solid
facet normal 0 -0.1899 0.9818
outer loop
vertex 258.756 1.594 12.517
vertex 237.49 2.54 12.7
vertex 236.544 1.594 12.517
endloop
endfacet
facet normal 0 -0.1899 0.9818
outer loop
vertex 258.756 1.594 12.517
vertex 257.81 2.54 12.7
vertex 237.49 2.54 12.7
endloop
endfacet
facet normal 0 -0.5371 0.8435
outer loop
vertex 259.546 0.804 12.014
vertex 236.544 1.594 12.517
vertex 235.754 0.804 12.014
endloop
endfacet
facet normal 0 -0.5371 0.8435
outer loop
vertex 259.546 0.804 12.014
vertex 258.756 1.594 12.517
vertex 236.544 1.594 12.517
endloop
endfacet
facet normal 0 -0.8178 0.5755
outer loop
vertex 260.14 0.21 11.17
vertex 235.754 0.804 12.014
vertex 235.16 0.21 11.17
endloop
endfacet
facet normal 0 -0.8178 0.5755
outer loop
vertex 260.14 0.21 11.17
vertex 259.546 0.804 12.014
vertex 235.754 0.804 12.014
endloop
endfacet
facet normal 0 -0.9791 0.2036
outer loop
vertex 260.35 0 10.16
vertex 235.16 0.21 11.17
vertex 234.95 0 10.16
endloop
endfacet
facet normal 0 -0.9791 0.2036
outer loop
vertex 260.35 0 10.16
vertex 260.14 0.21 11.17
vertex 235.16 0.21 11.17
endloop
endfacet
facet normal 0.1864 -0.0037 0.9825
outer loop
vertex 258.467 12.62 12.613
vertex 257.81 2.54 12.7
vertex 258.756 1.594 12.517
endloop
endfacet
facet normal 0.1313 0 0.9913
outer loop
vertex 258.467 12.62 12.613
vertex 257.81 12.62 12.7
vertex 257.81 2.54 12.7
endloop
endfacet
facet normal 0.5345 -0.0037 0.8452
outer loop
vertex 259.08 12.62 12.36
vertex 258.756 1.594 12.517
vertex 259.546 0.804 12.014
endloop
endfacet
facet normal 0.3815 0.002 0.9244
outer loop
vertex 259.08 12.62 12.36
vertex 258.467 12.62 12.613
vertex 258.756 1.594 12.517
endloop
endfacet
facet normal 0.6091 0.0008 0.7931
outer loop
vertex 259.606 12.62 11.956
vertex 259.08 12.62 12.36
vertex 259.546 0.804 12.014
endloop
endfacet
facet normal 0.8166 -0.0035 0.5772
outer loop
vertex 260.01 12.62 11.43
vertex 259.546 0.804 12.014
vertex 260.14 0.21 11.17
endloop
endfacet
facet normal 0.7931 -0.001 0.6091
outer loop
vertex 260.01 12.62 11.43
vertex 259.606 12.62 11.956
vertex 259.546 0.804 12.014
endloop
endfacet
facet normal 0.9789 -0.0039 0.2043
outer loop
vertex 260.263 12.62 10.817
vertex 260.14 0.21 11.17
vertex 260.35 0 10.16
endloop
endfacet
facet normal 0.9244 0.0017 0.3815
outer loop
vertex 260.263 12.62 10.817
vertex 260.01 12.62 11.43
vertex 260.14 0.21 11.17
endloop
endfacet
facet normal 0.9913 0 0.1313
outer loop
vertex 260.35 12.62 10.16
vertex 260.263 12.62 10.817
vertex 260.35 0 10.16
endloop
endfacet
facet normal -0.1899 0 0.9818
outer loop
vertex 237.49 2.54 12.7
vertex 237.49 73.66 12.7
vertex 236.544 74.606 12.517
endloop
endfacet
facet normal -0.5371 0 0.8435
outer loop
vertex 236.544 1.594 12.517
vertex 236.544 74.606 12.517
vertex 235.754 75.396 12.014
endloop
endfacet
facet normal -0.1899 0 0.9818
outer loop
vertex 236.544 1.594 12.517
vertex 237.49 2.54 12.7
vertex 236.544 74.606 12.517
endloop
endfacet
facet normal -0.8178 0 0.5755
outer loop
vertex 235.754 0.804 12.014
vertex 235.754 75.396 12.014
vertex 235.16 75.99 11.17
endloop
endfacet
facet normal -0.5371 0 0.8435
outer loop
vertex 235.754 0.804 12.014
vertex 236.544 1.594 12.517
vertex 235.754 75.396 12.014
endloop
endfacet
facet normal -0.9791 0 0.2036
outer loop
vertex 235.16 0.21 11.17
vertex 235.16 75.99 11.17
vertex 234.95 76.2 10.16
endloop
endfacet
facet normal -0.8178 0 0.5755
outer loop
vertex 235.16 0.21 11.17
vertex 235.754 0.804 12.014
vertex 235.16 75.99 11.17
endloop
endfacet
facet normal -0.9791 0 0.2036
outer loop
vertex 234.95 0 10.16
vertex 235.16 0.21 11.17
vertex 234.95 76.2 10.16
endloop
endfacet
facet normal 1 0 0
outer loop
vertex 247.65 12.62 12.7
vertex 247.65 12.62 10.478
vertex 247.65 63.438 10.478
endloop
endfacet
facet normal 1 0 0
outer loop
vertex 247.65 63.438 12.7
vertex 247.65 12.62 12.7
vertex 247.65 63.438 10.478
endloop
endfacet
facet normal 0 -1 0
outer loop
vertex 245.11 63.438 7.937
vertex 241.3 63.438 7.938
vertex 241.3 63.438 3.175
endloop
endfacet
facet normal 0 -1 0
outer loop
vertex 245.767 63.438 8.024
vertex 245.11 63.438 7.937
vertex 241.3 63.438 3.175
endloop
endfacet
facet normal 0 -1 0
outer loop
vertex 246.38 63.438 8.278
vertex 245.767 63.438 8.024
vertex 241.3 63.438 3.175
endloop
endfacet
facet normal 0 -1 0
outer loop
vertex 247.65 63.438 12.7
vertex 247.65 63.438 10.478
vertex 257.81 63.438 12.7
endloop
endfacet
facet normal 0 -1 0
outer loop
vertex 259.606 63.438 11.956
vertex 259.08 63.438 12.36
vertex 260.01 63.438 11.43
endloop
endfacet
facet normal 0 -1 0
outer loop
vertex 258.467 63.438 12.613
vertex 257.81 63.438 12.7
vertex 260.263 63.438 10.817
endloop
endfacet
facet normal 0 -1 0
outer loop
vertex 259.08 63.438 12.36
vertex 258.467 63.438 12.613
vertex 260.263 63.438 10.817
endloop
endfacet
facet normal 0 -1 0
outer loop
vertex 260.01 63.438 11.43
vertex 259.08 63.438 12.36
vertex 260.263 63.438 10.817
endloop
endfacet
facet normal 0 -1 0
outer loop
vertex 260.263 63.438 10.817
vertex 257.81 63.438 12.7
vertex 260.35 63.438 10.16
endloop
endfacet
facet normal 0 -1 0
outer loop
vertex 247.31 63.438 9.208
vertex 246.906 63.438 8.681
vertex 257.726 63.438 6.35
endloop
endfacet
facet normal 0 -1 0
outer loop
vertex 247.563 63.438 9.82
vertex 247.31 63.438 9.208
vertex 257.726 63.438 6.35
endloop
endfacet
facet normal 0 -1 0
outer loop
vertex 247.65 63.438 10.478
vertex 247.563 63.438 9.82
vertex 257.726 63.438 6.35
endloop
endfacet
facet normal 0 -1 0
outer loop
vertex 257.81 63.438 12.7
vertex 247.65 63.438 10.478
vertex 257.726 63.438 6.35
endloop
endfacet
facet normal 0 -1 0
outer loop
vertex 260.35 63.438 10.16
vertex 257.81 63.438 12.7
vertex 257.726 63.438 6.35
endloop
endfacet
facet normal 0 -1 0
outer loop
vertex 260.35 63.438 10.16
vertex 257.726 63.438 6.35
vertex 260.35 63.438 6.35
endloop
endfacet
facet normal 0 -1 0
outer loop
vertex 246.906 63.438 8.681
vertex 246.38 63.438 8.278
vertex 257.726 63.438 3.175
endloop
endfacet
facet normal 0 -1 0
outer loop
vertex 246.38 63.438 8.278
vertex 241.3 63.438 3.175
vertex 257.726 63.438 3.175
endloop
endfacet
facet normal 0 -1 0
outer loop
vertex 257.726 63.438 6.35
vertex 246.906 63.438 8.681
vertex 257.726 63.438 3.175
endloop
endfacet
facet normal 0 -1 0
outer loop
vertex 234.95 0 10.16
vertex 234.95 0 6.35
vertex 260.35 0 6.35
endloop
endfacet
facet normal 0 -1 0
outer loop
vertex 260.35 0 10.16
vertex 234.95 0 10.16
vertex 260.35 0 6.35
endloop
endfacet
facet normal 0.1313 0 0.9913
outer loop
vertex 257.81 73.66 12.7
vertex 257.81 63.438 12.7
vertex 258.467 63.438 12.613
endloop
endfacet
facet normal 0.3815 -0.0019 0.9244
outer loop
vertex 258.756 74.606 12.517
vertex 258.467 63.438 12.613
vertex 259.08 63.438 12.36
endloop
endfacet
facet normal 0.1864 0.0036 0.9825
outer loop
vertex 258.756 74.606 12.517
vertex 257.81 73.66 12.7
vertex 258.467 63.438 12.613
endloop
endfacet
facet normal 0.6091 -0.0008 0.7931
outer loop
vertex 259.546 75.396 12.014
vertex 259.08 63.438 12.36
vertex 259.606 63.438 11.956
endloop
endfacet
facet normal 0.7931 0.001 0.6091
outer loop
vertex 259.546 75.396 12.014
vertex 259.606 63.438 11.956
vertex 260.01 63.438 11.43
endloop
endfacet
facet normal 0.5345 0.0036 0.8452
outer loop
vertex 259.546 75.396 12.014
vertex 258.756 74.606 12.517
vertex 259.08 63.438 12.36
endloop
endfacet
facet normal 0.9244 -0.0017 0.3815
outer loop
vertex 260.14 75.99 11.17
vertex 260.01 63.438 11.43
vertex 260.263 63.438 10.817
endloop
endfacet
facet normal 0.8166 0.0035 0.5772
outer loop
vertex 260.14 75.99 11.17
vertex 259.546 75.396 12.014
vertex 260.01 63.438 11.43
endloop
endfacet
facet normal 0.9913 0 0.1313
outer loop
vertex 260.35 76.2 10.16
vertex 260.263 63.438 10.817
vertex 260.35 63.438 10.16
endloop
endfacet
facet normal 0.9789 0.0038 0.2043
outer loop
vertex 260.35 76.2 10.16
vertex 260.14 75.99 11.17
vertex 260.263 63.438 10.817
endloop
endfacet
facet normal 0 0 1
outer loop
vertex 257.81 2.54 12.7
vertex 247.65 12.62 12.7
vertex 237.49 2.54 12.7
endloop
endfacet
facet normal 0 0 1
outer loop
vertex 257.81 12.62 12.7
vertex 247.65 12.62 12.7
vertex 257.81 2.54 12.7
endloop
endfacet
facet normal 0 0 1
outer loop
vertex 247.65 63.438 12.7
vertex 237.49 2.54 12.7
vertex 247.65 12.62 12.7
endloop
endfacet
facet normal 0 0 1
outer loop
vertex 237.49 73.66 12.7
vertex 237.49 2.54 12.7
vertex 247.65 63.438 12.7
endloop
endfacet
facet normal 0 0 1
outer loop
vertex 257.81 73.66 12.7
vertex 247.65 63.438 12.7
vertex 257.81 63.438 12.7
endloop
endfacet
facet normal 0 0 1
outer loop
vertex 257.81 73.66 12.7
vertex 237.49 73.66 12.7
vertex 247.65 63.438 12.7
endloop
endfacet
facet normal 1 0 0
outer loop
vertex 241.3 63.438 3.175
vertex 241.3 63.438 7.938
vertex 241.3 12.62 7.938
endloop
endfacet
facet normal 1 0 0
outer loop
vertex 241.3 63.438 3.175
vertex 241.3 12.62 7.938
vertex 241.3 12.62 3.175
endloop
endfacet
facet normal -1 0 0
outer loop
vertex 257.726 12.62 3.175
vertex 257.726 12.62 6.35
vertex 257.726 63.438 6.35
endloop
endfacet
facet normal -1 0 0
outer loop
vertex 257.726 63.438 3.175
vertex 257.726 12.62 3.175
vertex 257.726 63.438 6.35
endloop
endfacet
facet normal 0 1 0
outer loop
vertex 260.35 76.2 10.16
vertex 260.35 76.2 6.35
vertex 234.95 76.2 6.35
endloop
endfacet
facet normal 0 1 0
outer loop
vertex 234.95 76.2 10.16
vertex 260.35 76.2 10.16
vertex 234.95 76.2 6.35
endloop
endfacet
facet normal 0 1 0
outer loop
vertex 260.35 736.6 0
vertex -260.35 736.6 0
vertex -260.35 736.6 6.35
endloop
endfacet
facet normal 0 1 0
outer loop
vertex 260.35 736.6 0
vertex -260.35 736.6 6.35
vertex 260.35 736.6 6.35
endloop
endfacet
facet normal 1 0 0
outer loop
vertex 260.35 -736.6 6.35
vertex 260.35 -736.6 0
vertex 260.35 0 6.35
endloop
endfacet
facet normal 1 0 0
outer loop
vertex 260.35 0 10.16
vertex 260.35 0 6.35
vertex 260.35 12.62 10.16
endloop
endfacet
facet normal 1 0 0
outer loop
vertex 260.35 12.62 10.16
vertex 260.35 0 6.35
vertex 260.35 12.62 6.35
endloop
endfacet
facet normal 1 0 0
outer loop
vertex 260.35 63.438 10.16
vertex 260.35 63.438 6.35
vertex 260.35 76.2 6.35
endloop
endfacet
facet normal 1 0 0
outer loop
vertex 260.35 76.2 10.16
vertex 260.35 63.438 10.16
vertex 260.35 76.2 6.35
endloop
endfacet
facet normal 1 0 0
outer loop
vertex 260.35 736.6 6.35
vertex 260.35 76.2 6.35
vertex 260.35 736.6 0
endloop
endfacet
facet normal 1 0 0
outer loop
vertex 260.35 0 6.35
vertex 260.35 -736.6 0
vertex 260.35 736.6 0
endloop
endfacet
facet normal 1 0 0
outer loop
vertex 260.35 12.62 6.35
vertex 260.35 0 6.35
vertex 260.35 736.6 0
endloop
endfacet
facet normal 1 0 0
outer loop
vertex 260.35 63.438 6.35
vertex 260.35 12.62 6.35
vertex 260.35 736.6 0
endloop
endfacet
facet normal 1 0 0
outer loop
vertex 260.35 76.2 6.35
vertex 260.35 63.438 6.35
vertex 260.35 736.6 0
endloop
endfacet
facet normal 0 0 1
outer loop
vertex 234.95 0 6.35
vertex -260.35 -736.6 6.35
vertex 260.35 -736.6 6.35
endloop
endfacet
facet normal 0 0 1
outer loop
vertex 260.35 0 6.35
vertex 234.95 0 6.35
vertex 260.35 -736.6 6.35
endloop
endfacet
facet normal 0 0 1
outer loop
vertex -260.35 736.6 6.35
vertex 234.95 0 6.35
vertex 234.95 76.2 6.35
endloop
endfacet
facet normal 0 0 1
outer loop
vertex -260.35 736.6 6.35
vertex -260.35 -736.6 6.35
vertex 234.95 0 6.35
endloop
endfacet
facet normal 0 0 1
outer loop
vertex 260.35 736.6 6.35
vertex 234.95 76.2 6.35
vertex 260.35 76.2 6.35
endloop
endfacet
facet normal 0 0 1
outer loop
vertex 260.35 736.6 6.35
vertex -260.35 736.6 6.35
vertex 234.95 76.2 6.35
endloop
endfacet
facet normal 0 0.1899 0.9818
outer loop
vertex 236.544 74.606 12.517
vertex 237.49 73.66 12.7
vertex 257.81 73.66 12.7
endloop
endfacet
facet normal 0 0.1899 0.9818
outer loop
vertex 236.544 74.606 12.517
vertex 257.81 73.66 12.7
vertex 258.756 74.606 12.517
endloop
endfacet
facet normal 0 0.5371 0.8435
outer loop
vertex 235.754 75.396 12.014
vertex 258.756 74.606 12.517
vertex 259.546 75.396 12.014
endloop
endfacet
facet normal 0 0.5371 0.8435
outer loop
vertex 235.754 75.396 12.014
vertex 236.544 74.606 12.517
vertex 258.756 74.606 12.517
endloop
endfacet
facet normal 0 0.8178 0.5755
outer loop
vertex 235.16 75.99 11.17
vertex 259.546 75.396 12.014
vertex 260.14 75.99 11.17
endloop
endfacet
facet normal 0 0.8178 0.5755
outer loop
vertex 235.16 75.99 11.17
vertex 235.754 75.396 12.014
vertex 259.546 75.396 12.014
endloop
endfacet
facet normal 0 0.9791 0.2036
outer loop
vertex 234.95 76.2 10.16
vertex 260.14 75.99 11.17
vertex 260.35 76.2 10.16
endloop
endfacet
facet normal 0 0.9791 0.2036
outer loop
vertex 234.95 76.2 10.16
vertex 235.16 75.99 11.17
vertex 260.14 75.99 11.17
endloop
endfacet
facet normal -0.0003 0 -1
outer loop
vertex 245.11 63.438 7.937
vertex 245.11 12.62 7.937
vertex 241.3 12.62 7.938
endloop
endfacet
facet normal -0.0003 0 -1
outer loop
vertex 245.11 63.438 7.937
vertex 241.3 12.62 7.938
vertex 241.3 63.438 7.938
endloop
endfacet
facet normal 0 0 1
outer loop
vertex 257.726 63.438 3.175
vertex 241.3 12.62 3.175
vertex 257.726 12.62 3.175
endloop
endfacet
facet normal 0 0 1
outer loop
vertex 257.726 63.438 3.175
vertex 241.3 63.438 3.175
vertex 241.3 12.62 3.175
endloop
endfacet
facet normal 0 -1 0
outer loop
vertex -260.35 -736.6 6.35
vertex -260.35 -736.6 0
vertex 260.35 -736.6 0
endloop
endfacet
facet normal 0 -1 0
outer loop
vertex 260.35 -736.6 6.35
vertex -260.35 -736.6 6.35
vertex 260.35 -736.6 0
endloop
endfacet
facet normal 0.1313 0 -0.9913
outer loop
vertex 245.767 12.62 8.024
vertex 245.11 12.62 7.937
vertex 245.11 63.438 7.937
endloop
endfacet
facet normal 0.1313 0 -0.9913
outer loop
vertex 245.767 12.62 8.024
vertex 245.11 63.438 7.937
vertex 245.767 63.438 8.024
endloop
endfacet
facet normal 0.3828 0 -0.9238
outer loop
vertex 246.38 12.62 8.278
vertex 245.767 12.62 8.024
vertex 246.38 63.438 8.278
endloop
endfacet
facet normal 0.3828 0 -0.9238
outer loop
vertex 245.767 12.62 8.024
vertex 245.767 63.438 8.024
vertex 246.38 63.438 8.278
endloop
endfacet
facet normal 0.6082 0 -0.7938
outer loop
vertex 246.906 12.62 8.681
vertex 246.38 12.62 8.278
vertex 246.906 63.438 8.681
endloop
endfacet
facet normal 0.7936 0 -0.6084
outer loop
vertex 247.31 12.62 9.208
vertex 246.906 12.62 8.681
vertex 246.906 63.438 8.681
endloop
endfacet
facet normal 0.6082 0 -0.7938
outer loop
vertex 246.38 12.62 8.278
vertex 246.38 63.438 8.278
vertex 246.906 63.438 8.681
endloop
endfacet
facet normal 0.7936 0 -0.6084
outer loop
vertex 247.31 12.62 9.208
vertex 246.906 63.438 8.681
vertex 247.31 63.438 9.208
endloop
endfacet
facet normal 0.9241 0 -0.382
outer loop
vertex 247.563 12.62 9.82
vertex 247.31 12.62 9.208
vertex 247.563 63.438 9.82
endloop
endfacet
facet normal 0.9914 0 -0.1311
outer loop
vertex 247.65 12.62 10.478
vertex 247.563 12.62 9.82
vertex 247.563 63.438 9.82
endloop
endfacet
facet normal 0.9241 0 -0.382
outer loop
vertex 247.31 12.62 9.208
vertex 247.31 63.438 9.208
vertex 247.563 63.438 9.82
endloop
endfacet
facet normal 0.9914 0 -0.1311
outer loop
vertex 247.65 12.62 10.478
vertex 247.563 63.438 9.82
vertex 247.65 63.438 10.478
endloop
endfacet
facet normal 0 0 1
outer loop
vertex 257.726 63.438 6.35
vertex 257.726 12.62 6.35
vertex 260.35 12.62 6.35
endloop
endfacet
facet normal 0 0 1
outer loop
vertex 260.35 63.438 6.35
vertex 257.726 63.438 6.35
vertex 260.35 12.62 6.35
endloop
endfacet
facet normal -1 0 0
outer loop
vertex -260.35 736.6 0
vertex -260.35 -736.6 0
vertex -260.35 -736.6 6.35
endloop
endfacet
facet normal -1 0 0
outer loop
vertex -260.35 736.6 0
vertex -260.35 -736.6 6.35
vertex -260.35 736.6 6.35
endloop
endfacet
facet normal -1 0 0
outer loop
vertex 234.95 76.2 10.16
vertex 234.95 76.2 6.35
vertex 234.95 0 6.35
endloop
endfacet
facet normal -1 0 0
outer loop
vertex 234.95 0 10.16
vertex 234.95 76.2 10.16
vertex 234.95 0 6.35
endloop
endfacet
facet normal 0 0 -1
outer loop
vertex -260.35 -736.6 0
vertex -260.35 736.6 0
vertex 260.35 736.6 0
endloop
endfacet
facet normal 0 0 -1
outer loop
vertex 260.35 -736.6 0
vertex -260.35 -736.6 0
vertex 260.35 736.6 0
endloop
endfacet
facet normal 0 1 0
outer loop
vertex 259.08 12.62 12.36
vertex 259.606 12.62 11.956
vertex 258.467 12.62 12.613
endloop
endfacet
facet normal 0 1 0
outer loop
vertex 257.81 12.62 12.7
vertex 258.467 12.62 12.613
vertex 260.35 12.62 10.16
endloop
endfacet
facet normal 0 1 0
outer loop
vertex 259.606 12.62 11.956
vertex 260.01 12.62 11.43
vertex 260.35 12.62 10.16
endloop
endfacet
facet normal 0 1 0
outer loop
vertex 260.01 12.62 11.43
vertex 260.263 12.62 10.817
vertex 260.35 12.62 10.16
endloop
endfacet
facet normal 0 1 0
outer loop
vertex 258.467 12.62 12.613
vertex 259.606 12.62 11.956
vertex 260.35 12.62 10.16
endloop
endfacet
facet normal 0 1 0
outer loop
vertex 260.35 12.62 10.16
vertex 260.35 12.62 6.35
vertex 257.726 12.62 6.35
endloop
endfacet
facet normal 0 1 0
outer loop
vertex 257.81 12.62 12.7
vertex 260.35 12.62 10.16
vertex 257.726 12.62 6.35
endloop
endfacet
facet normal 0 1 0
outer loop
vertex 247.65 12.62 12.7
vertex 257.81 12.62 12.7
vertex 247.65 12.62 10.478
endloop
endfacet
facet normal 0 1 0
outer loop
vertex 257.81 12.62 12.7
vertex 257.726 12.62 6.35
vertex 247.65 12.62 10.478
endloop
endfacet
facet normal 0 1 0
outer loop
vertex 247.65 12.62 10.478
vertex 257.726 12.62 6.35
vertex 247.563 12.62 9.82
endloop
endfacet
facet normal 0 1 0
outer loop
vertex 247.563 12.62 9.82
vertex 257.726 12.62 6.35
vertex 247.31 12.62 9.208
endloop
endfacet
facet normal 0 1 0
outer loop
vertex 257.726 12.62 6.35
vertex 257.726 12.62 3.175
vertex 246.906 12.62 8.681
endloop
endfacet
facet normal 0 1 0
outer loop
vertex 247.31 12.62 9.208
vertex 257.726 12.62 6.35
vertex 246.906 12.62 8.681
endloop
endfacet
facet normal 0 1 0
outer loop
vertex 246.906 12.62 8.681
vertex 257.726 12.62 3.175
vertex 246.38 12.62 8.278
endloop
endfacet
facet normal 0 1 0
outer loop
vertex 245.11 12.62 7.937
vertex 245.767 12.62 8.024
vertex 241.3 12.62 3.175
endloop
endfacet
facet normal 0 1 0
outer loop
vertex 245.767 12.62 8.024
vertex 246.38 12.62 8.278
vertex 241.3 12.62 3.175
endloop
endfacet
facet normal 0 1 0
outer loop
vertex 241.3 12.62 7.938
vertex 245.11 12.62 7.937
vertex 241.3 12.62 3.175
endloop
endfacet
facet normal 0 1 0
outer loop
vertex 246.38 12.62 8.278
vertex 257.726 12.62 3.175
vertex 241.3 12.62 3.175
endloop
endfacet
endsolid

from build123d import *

# Parameters (mm, degrees)
SKETCH1_W           = 520.7
SKETCH1_H           = 1473.2
BOSS_EXTRUDE1_DEPTH = 6.35
BOSS_EXTRUDE2_DEPTH = 6.35
SKETCH2_4_W         = 10.0763546
SKETCH2_4_H         = 50.817669104
CUT_EXTRUDE1_DEPTH  = 3.175
SKETCH4_W           = 4.7625
SKETCH4_H           = 50.817669104
CUT_EXTRUDE2_DEPTH  = 6.35
FILLET1_R           = 2.54
FILLET2_R           = 2.54


with BuildPart() as part:
    # Sketch1 → Boss-Extrude1 (new body)
    with BuildSketch(Plane.XY):
        Rectangle(SKETCH1_W, SKETCH1_H)
    extrude(amount=BOSS_EXTRUDE1_DEPTH)

    # Sketch2 → Boss-Extrude2 (add)
    with BuildSketch(Plane.XY.offset(6.35)):
        Polygon((234.95, 0), (260.35, 0), (260.35, 12.620459264), (257.7263546, 12.620459264), (247.65, 12.620459264), (247.65, 63.438128368), (257.7263546, 63.438128368), (260.35, 63.438128368), (260.35, 76.2), (234.95, 76.2), align=None)
    extrude(amount=BOSS_EXTRUDE2_DEPTH)

    # Sketch2<4> → Cut-Extrude1 (cut)
    with BuildSketch(Plane.XY.offset(6.35)):
        with Locations((252.6881773, 38.029293816)):
            Rectangle(SKETCH2_4_W, SKETCH2_4_H)
    extrude(amount=-CUT_EXTRUDE1_DEPTH, mode=Mode.SUBTRACT)

    # Sketch4 → Cut-Extrude2 (cut)
    with BuildSketch(Plane(origin=(247.65, 0, 0), x_dir=(0, 0, -1), z_dir=(1, 0, 0))):
        with Locations((-5.55625, 38.029293816)):
            Rectangle(SKETCH4_W, SKETCH4_H)
    extrude(amount=-CUT_EXTRUDE2_DEPTH, mode=Mode.SUBTRACT)

    # Fillet1
    fillet1_edges = [part.edges().sort_by_distance(p)[0] for p in [
        (247.65, 38.029293816, 7.9375),
    ]]
    fillet(fillet1_edges, radius=FILLET1_R)

    # Fillet2
    fillet2_edges = [part.edges().sort_by_distance(p)[0] for p in [
        (234.95, 38.1, 12.7),
        (247.65, 0, 12.7),
        (260.35, 69.819064184, 12.7),
        (247.65, 76.2, 12.7),
        (260.35, 6.310229632, 12.7),
    ]]
    fillet(fillet2_edges, radius=FILLET2_R)


solid = part.part
